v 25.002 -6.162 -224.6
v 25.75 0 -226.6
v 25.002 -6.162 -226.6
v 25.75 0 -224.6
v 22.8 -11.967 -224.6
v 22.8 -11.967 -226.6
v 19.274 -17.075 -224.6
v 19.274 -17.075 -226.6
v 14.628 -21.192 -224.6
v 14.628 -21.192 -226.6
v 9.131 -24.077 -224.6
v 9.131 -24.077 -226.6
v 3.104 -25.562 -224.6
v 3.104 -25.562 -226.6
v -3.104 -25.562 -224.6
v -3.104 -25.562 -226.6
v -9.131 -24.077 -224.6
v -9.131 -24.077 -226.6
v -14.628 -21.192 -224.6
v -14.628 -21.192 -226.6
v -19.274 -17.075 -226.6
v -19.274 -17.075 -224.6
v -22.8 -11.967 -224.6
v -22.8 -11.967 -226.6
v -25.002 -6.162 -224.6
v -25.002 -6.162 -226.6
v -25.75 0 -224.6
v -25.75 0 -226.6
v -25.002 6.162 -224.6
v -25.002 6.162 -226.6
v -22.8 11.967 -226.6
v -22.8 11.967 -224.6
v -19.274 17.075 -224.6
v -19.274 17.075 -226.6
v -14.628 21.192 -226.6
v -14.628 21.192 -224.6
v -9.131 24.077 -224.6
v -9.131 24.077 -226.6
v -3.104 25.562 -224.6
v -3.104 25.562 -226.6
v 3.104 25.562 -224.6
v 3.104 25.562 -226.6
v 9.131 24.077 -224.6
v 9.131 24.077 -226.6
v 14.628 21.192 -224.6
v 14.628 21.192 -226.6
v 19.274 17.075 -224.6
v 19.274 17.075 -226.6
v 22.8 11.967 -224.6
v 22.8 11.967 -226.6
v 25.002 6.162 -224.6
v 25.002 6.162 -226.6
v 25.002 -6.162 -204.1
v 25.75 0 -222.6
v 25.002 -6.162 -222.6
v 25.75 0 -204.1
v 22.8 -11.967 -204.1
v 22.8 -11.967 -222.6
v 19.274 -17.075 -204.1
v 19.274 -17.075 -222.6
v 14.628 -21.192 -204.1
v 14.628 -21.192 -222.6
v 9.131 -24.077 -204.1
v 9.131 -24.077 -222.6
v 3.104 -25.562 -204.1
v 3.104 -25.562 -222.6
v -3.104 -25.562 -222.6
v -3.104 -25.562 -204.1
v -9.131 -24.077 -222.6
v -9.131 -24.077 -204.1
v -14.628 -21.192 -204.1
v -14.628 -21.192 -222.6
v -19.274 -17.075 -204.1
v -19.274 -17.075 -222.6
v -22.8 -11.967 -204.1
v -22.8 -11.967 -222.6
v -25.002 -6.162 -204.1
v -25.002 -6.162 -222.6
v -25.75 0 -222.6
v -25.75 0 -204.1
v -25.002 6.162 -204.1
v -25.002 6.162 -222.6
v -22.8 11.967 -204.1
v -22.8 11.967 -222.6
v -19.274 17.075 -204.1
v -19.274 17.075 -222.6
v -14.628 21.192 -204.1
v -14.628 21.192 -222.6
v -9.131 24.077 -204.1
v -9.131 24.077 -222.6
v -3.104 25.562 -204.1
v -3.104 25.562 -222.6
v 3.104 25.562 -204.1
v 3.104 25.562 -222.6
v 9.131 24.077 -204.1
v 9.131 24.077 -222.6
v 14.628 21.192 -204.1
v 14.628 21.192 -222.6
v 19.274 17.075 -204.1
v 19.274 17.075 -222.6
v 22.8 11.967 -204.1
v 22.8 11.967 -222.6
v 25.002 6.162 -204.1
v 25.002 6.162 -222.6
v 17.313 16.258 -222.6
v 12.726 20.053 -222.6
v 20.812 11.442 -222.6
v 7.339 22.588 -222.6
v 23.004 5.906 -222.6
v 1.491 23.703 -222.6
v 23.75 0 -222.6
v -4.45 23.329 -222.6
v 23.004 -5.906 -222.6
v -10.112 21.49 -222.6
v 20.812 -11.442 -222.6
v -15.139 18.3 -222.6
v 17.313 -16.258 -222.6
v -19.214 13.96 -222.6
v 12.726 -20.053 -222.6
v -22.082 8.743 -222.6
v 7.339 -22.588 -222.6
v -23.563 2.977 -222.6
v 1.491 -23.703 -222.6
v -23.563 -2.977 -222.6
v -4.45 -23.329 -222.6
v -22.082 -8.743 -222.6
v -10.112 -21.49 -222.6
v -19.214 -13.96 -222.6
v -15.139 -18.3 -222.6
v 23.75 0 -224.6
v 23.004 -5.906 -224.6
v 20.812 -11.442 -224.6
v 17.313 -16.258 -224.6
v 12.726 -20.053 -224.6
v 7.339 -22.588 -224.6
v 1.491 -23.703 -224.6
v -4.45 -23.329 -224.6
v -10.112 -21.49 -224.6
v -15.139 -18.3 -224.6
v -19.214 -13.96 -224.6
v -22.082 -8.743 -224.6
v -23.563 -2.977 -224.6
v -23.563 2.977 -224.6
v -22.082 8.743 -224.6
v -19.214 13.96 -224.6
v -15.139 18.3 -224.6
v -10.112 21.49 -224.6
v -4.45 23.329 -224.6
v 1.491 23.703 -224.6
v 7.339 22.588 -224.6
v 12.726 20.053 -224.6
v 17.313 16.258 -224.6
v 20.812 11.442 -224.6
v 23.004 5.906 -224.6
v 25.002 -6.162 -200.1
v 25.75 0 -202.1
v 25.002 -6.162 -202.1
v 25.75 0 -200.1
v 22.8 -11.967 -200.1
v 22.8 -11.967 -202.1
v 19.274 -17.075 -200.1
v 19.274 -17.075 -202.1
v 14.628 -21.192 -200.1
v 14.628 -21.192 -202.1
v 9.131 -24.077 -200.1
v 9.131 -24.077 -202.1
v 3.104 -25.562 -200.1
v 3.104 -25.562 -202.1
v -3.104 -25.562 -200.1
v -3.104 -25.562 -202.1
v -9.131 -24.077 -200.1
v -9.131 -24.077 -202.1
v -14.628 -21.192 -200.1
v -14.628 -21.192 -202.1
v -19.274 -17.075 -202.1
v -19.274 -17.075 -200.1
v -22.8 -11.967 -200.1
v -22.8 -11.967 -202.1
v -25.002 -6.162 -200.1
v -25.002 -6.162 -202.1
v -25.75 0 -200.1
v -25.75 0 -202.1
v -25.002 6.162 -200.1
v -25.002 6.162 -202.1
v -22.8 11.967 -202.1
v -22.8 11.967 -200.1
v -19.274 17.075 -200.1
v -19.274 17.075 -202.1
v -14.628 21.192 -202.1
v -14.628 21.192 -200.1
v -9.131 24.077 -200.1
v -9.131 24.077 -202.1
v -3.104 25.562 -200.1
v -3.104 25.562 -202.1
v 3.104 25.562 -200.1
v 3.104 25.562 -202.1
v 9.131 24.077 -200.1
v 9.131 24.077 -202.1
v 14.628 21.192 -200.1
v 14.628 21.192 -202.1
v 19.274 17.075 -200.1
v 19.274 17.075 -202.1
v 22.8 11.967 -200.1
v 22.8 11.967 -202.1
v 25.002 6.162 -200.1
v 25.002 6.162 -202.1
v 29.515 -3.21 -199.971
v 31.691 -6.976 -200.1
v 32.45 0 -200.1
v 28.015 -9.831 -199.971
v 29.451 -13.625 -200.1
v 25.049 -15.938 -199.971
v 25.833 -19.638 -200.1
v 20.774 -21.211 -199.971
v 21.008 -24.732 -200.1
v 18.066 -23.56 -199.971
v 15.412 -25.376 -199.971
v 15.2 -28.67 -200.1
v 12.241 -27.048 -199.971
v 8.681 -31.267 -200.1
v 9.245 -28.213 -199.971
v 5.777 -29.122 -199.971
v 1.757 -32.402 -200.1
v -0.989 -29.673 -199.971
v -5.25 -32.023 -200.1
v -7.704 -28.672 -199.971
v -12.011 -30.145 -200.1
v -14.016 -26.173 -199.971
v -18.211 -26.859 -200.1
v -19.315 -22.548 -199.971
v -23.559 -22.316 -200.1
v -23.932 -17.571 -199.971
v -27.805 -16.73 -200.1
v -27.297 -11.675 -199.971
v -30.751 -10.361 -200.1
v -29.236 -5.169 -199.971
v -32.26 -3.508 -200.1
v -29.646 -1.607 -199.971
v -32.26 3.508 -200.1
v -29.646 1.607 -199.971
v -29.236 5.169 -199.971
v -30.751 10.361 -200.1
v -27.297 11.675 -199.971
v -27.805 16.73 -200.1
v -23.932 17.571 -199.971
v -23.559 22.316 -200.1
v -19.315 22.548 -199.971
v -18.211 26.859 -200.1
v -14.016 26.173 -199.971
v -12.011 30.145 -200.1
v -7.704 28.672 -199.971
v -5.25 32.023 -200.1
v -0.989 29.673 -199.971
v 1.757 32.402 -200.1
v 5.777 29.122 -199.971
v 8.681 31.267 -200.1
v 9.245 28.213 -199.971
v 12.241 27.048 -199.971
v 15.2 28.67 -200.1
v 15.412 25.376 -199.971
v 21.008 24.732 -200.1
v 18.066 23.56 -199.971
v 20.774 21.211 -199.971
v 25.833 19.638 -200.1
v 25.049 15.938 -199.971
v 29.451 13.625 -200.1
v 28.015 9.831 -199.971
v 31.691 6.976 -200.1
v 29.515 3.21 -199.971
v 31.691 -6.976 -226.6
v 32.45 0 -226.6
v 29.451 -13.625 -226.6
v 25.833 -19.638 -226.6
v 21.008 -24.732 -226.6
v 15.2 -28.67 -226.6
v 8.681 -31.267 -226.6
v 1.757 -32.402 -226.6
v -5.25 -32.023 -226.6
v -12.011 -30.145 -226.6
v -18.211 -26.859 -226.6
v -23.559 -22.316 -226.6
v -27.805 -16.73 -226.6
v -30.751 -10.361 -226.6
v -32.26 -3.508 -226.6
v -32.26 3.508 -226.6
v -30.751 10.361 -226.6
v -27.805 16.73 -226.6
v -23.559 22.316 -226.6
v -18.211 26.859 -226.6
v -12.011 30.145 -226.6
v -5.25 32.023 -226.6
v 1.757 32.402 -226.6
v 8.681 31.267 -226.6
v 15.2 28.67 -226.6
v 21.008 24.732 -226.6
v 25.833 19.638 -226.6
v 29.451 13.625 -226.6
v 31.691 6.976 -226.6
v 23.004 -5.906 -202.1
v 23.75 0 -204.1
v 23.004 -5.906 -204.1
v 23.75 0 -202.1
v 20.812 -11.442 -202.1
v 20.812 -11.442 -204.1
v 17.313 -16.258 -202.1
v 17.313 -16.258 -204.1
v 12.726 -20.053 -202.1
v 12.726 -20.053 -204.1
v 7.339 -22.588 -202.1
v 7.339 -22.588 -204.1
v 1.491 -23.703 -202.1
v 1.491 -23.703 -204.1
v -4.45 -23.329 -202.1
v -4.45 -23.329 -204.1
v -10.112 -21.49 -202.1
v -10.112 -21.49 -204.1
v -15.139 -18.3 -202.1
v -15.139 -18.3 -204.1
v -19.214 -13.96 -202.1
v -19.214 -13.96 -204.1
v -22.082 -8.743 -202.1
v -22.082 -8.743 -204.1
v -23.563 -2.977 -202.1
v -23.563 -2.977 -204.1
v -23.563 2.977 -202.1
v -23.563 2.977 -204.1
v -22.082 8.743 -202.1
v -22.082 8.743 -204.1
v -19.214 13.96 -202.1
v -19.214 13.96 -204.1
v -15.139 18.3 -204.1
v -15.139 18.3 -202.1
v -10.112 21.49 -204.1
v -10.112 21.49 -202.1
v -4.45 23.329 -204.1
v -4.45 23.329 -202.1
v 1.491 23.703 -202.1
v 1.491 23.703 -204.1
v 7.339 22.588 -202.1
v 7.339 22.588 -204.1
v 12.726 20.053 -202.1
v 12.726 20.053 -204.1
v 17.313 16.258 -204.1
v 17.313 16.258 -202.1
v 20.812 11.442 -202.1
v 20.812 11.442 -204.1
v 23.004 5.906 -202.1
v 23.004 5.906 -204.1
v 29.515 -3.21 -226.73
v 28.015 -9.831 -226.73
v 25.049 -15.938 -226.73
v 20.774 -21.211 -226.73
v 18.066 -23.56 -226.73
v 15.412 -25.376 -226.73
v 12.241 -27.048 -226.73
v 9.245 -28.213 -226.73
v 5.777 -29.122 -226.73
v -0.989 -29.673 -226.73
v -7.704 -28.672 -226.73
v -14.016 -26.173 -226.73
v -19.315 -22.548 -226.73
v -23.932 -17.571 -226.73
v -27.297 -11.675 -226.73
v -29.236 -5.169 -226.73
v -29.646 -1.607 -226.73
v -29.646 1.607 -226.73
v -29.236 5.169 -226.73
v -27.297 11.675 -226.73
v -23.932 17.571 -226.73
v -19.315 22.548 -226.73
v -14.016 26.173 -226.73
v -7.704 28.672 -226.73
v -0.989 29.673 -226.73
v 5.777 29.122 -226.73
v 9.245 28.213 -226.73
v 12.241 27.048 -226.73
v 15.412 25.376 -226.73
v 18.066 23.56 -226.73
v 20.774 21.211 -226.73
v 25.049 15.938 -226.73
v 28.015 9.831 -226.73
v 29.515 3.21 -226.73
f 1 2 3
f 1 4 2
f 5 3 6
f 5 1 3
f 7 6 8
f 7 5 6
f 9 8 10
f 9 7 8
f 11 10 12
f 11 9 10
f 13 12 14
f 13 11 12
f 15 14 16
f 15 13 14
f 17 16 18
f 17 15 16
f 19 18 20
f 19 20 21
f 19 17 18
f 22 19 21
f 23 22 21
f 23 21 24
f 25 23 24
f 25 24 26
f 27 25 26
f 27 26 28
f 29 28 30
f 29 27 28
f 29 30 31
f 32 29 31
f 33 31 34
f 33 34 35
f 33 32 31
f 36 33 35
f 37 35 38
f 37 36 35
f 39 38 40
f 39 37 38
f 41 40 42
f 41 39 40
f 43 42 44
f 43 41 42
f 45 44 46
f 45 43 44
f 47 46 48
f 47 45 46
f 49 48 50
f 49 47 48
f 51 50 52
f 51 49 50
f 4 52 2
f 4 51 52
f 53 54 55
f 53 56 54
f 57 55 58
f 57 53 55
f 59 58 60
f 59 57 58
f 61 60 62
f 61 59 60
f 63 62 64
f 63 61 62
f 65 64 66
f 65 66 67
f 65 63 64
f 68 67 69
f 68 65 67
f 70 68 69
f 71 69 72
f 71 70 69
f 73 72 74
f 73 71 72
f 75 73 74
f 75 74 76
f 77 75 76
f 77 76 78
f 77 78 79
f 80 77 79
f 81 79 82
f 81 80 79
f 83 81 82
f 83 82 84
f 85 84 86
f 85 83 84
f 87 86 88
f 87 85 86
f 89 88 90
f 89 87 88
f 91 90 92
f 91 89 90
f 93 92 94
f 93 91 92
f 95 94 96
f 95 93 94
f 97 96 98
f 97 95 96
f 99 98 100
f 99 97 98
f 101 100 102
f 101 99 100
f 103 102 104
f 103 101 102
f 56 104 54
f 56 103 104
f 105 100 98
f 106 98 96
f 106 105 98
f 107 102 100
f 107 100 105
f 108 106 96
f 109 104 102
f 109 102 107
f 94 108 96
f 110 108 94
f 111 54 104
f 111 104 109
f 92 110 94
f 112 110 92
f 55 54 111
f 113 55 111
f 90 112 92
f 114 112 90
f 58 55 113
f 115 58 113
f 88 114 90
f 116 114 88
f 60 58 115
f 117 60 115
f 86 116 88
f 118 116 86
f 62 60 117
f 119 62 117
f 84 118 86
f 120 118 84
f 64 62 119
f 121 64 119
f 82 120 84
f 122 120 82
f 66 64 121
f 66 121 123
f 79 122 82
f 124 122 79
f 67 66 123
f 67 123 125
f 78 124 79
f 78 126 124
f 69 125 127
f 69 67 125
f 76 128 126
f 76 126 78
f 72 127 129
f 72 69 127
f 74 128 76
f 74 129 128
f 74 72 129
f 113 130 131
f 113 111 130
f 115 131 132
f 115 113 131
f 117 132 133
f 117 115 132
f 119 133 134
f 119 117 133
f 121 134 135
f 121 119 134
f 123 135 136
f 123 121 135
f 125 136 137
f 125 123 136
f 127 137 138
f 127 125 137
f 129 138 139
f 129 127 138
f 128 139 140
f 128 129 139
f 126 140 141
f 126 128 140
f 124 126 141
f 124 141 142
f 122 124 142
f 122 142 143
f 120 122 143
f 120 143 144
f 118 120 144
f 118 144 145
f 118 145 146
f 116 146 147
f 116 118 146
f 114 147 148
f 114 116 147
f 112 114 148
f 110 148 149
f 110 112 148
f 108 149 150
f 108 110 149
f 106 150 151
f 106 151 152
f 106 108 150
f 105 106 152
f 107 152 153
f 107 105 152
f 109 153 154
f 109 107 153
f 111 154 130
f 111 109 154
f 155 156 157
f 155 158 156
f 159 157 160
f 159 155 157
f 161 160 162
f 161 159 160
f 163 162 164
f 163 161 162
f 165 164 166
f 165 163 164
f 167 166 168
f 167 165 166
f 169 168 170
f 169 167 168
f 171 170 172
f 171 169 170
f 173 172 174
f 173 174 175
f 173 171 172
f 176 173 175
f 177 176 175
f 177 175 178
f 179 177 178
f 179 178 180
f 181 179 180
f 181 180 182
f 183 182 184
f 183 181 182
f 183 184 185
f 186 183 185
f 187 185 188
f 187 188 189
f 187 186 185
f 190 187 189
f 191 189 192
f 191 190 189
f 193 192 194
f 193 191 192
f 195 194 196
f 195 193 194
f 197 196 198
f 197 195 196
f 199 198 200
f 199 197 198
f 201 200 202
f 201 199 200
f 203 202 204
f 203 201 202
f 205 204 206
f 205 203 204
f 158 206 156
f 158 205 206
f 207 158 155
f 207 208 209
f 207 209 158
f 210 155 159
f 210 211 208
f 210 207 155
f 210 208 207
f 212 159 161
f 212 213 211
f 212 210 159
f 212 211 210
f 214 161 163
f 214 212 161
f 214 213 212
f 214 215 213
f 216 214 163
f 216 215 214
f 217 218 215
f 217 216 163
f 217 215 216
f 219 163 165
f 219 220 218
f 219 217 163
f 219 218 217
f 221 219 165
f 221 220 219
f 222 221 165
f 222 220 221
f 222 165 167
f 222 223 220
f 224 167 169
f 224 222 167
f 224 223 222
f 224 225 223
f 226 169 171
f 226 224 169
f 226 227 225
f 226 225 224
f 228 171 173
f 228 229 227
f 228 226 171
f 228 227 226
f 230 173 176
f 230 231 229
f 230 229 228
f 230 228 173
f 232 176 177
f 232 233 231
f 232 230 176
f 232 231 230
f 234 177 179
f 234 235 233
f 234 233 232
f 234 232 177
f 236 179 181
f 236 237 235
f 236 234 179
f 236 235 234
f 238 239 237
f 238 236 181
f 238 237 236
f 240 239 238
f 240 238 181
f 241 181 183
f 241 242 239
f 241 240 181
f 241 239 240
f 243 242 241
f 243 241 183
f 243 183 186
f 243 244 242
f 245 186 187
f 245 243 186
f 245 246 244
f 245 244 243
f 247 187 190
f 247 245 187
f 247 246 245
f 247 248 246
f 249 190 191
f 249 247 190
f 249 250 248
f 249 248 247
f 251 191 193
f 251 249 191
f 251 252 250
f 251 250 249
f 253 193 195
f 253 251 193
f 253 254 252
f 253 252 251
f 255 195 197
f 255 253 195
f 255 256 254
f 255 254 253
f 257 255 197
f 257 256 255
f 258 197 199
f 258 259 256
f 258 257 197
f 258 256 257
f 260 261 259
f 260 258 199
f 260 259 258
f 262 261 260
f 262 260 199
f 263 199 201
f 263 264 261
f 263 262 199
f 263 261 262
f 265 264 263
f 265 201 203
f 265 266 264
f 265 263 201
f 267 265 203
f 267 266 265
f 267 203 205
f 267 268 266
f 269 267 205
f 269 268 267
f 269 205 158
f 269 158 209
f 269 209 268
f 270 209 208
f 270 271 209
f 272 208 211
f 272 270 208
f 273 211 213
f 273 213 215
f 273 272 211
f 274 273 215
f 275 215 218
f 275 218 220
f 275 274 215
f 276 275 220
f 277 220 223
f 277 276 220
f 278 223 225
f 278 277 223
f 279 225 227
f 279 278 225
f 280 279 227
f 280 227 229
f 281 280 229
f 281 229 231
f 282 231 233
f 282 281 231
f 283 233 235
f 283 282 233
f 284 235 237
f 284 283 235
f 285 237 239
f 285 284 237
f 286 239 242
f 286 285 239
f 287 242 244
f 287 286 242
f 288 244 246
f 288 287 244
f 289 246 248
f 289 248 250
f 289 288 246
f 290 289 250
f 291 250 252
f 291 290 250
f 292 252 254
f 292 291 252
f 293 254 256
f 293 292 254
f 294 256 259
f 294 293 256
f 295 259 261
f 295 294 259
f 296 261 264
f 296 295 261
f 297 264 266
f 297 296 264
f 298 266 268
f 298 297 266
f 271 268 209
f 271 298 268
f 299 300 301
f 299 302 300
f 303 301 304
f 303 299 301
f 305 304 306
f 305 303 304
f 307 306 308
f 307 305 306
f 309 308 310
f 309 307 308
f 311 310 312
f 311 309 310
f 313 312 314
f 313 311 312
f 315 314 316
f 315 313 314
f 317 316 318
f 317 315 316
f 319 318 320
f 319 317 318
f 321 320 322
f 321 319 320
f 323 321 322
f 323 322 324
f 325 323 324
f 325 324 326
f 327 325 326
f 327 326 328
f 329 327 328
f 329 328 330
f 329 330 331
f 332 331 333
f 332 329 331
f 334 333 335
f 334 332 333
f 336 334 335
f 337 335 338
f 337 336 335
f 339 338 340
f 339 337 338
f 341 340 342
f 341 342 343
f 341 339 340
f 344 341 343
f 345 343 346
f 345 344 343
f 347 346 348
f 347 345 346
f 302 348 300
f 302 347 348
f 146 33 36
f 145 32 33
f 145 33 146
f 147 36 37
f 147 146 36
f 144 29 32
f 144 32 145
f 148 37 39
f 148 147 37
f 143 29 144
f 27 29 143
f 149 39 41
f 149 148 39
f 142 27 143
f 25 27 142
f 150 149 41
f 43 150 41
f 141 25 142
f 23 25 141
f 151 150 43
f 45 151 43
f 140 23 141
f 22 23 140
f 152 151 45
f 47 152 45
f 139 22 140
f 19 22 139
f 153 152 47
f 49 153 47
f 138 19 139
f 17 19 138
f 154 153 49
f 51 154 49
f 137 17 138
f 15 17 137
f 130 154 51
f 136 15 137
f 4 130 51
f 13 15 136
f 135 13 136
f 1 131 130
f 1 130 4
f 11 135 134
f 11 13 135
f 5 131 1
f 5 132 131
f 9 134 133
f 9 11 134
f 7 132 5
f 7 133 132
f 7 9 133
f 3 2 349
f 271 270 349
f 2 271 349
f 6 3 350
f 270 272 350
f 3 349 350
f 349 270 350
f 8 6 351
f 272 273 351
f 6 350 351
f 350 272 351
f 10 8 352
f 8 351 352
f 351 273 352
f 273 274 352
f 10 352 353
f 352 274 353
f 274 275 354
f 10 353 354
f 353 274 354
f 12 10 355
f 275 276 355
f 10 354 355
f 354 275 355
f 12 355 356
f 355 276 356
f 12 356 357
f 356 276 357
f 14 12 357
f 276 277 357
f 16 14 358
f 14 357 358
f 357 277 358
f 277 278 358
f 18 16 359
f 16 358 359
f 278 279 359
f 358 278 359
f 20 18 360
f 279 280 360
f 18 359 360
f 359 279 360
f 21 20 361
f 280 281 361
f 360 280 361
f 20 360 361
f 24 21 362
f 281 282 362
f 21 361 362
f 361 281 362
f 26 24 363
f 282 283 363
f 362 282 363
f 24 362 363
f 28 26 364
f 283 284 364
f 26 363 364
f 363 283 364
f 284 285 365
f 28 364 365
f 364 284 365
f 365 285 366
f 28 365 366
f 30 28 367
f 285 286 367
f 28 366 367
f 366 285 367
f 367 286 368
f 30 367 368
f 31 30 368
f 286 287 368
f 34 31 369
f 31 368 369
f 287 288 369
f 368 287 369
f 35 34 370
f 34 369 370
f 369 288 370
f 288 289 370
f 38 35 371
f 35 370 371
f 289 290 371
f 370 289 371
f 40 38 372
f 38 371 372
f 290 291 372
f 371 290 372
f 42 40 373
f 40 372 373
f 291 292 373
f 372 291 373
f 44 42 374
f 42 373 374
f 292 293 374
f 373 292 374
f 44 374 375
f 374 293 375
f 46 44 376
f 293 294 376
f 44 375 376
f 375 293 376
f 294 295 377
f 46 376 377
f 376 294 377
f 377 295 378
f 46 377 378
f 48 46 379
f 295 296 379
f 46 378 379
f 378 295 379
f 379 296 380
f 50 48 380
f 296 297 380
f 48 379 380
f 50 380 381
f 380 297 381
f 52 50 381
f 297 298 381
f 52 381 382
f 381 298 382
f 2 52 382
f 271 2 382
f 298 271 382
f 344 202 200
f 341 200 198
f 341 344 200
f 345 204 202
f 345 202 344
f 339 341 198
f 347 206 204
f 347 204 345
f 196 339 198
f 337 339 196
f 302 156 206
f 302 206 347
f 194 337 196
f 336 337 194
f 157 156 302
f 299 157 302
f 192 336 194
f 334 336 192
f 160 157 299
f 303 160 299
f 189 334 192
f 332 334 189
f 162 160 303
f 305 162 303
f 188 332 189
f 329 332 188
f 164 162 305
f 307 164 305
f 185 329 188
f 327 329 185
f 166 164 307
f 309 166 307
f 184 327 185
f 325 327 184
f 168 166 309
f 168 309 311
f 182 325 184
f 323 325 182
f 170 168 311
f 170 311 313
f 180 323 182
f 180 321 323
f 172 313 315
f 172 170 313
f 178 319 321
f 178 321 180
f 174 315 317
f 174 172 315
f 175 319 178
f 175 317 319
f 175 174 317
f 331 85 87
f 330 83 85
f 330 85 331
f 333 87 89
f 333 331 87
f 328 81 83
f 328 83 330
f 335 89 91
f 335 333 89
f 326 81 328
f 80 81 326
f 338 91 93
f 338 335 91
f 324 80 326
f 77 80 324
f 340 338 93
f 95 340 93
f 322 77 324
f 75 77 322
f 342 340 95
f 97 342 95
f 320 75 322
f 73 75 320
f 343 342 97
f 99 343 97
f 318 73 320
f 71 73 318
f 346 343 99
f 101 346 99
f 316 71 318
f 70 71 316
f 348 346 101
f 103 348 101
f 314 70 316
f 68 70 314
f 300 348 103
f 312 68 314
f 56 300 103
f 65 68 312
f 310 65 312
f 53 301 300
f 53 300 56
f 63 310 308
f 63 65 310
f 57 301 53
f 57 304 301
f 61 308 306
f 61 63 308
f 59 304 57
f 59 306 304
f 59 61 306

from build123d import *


with BuildPart() as part:
    # Sketch1 → Revolve1 (revolve)
    with BuildSketch(Plane(origin=(0, 0, 0), x_dir=(1, 0, 0), z_dir=(0, 1, 0))):
        with BuildLine():
            Line((25.75, 226.600121105), (25.75, 224.600121105))
            Line((25.75, 224.600121105), (23.75, 224.600121105))
            Line((23.75, 224.600121105), (23.75, 222.600121105))
            Line((23.75, 222.600121105), (25.75, 222.600121105))
            Line((25.75, 222.600121105), (25.75, 204.100121105))
            Line((25.75, 204.100121105), (23.75, 204.100121105))
            Line((23.75, 204.100121105), (23.75, 202.100121105))
            Line((23.75, 202.100121105), (25.75, 202.100121105))
            Line((25.75, 202.100121105), (25.75, 200.100121105))
            add(Edge.make_bspline(
                [(25.75, 200.100121105), (28.665236828, 199.927378107), (31.106495402, 199.927378107), (32.45, 200.100121105)],
                knots=[0, 0, 0, 0, 1, 1, 1, 1], degree=3))
            Line((32.45, 200.100121105), (32.45, 226.600121105))
            add(Edge.make_bspline(
                [(25.75, 226.600121105), (28.665236828, 226.772864103), (31.106495402, 226.772864103), (32.45, 226.600121105)],
                knots=[0, 0, 0, 0, 1, 1, 1, 1], degree=3))
        make_face()
    revolve(axis=Axis((0, 0, 0), (0, 0, -1)))


solid = part.part
